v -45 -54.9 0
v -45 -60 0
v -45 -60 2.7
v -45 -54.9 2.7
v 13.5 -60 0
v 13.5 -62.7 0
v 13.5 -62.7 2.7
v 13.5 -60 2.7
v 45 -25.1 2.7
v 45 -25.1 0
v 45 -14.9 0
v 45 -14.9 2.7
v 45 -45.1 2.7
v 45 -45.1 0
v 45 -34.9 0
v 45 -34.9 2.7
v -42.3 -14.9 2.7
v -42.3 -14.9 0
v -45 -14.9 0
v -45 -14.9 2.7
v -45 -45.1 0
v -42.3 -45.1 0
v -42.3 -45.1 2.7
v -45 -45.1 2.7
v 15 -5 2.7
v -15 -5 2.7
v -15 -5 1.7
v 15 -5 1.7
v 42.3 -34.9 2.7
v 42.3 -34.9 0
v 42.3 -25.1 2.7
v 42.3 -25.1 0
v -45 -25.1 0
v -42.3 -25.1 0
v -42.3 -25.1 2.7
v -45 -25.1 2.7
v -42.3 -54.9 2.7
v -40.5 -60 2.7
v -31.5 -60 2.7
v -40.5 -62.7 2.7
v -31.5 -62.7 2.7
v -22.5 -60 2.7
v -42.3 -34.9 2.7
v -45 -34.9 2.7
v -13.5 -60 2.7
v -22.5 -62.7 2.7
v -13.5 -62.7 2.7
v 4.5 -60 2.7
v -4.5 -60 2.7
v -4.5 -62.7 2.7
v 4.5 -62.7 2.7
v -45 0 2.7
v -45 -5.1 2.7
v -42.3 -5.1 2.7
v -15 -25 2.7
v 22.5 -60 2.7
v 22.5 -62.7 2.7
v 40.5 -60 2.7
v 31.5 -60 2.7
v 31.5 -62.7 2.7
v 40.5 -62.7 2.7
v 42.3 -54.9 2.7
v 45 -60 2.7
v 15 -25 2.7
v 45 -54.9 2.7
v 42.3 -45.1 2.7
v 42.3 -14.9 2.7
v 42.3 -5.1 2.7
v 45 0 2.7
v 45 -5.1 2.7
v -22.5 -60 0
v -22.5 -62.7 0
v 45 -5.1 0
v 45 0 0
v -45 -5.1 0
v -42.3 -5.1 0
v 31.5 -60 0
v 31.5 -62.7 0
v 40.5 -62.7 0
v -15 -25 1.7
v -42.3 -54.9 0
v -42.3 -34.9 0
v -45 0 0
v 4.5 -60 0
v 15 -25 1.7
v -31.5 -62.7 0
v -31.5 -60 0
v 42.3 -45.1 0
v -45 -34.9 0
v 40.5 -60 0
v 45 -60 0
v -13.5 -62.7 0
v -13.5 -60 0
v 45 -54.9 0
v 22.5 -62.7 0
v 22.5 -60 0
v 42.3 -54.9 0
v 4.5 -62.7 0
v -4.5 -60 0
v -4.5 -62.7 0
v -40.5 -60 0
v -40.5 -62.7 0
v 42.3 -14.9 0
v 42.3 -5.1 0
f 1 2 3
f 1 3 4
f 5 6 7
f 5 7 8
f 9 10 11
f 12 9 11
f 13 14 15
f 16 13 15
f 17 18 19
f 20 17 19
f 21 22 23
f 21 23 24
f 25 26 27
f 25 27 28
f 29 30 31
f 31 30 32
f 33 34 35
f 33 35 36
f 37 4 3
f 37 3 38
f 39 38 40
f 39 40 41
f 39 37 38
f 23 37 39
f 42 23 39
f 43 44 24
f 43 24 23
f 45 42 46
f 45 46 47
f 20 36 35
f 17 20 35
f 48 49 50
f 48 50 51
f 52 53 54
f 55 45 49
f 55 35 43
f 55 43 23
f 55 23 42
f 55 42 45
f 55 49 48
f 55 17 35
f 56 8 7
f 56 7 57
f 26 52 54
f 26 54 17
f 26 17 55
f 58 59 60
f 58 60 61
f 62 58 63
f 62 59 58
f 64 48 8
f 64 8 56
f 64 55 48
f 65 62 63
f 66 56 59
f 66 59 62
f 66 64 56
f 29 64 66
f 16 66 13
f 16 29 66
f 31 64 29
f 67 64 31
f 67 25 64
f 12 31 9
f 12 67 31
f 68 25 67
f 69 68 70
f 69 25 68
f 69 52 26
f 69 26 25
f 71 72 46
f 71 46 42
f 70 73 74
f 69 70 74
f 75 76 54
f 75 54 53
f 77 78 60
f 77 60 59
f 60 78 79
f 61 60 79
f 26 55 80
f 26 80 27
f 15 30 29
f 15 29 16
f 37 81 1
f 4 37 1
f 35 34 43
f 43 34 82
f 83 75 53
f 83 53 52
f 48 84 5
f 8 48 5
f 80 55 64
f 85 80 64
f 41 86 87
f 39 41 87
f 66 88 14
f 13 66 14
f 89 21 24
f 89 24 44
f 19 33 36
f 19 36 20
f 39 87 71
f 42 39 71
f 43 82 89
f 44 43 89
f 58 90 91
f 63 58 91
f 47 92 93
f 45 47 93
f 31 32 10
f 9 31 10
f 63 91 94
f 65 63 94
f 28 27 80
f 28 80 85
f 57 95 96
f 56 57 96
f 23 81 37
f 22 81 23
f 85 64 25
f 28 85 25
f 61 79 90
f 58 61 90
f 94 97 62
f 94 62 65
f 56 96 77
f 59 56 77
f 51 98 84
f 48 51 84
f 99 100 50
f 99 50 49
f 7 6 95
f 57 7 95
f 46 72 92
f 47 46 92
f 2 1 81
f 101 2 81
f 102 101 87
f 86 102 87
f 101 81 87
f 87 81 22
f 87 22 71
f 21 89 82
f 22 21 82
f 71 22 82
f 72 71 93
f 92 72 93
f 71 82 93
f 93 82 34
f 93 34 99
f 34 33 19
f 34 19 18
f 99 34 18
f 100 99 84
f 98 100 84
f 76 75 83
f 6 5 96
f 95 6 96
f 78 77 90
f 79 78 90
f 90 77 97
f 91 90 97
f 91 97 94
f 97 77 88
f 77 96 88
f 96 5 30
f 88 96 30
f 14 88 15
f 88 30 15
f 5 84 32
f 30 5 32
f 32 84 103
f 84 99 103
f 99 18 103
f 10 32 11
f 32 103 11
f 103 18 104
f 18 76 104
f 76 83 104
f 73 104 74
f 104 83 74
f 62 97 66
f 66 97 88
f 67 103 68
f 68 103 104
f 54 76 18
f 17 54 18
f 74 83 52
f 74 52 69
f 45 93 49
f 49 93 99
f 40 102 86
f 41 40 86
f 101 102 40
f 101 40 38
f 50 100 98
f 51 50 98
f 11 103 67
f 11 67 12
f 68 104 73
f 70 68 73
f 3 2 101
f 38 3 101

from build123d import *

# Parameters (mm, degrees)
ESQUISSE1_W                    = 90
ESQUISSE1_H                    = 60
BOSS_EXTRU_1_DEPTH             = 2.7
ESQUISSE2_W                    = 9
ESQUISSE2_H                    = 2.7
BOSS_EXTRU_2_DEPTH             = 2.7
R_P_TITION_LIN_AIRE1_COUNT     = 3
R_P_TITION_LIN_AIRE1_PITCH     = 18
R_P_TITION_LIN_AIRE1_COL_COUNT = 3
R_P_TITION_LIN_AIRE1_COL_PITCH = 18
ESQUISSE3_W                    = 2.7
ESQUISSE3_H                    = 9.8
ENL_V_MAT_EXTRU_1_DEPTH        = 2.7
R_P_TITION_LIN_AIRE2_COUNT     = 5
R_P_TITION_LIN_AIRE2_PITCH     = 20
SYM_TRIE1_COPY_1_SKETCH_W      = 2.7
SYM_TRIE1_COPY_1_SKETCH_H      = 9.8
SYM_TRIE1_COPY_1_DEPTH         = 2.7
SYM_TRIE1_COPY_2_SKETCH_W      = 2.7
SYM_TRIE1_COPY_2_SKETCH_H      = 9.8
SYM_TRIE1_COPY_2_DEPTH         = 2.7
SYM_TRIE1_COPY_3_SKETCH_W      = 2.7
SYM_TRIE1_COPY_3_SKETCH_H      = 9.8
SYM_TRIE1_COPY_3_DEPTH         = 2.7
SYM_TRIE1_COPY_4_SKETCH_W      = 2.7
SYM_TRIE1_COPY_4_SKETCH_H      = 9.8
SYM_TRIE1_COPY_4_DEPTH         = 2.7
ESQUISSE14_W                   = 30
ESQUISSE14_H                   = 20
ENL_V_MAT_EXTRU_4_DEPTH        = 1


with BuildPart() as part:
    # Esquisse1 → Boss.-Extru.1 (new body)
    with BuildSketch(Plane.XY):
        with Locations((0, -30)):
            Rectangle(ESQUISSE1_W, ESQUISSE1_H)
    extrude(amount=BOSS_EXTRU_1_DEPTH)

    # Esquisse2 → Boss.-Extru.2 (add)
    with BuildSketch(Plane.XY):
        with Locations((0, -61.35)):
            Rectangle(ESQUISSE2_W, ESQUISSE2_H)
    boss_extru_2 = extrude(amount=BOSS_EXTRU_2_DEPTH)

    # Répétition linéaire1: Boss.-Extru.2 ×3
    with Locations(*[(i * R_P_TITION_LIN_AIRE1_PITCH, 0, 0) for i in range(1, R_P_TITION_LIN_AIRE1_COUNT)]):
        add(boss_extru_2)

    # Répétition linéaire1 col: Boss.-Extru.2 ×3
    with Locations(*[(-i * R_P_TITION_LIN_AIRE1_COL_PITCH, 0, 0) for i in range(1, R_P_TITION_LIN_AIRE1_COL_COUNT)]):
        add(boss_extru_2)

    # Esquisse3 → Enlèv. mat.-Extru.1 (cut)
    with BuildSketch(Plane.XY):
        with Locations((43.65, -50)):
            Rectangle(ESQUISSE3_W, ESQUISSE3_H)
    enl_v_mat_extru_1 = extrude(amount=ENL_V_MAT_EXTRU_1_DEPTH, mode=Mode.SUBTRACT)

    # Répétition linéaire2: Enlèv. mat.-Extru.1 ×5
    with Locations(*[(0, i * R_P_TITION_LIN_AIRE2_PITCH, 0) for i in range(1, R_P_TITION_LIN_AIRE2_COUNT)]):
        add(enl_v_mat_extru_1, mode=Mode.SUBTRACT)

    # Symétrie1: Enlèv. mat.-Extru.1 across plane
    add(enl_v_mat_extru_1.mirror(Plane(origin=(0, 0, 0), x_dir=(0, 0, 1), z_dir=(1, 0, 0))), mode=Mode.SUBTRACT)

    # Symétrie1 copy 1 sketch → Symétrie1 copy 1 (cut)
    with BuildSketch(Plane(origin=(0, 20, 0), x_dir=(-1, 0, 0), z_dir=(0, 0, 1))):
        with Locations((43.65, 50)):
            Rectangle(SYM_TRIE1_COPY_1_SKETCH_W, SYM_TRIE1_COPY_1_SKETCH_H)
    extrude(amount=SYM_TRIE1_COPY_1_DEPTH, mode=Mode.SUBTRACT)

    # Symétrie1 copy 2 sketch → Symétrie1 copy 2 (cut)
    with BuildSketch(Plane(origin=(0, 40, 0), x_dir=(-1, 0, 0), z_dir=(0, 0, 1))):
        with Locations((43.65, 50)):
            Rectangle(SYM_TRIE1_COPY_2_SKETCH_W, SYM_TRIE1_COPY_2_SKETCH_H)
    extrude(amount=SYM_TRIE1_COPY_2_DEPTH, mode=Mode.SUBTRACT)

    # Symétrie1 copy 3 sketch → Symétrie1 copy 3 (cut)
    with BuildSketch(Plane(origin=(0, 60, 0), x_dir=(-1, 0, 0), z_dir=(0, 0, 1))):
        with Locations((43.65, 50)):
            Rectangle(SYM_TRIE1_COPY_3_SKETCH_W, SYM_TRIE1_COPY_3_SKETCH_H)
    extrude(amount=SYM_TRIE1_COPY_3_DEPTH, mode=Mode.SUBTRACT)

    # Symétrie1 copy 4 sketch → Symétrie1 copy 4 (cut)
    with BuildSketch(Plane(origin=(0, 80, 0), x_dir=(-1, 0, 0), z_dir=(0, 0, 1))):
        with Locations((43.65, 50)):
            Rectangle(SYM_TRIE1_COPY_4_SKETCH_W, SYM_TRIE1_COPY_4_SKETCH_H)
    extrude(amount=SYM_TRIE1_COPY_4_DEPTH, mode=Mode.SUBTRACT)

    # Esquisse14 → Enlèv. mat.-Extru.4 (cut)
    with BuildSketch(Plane.XY.offset(2.7)):
        with Locations((0, -15)):
            Rectangle(ESQUISSE14_W, ESQUISSE14_H)
    extrude(amount=-ENL_V_MAT_EXTRU_4_DEPTH, mode=Mode.SUBTRACT)


solid = part.part
